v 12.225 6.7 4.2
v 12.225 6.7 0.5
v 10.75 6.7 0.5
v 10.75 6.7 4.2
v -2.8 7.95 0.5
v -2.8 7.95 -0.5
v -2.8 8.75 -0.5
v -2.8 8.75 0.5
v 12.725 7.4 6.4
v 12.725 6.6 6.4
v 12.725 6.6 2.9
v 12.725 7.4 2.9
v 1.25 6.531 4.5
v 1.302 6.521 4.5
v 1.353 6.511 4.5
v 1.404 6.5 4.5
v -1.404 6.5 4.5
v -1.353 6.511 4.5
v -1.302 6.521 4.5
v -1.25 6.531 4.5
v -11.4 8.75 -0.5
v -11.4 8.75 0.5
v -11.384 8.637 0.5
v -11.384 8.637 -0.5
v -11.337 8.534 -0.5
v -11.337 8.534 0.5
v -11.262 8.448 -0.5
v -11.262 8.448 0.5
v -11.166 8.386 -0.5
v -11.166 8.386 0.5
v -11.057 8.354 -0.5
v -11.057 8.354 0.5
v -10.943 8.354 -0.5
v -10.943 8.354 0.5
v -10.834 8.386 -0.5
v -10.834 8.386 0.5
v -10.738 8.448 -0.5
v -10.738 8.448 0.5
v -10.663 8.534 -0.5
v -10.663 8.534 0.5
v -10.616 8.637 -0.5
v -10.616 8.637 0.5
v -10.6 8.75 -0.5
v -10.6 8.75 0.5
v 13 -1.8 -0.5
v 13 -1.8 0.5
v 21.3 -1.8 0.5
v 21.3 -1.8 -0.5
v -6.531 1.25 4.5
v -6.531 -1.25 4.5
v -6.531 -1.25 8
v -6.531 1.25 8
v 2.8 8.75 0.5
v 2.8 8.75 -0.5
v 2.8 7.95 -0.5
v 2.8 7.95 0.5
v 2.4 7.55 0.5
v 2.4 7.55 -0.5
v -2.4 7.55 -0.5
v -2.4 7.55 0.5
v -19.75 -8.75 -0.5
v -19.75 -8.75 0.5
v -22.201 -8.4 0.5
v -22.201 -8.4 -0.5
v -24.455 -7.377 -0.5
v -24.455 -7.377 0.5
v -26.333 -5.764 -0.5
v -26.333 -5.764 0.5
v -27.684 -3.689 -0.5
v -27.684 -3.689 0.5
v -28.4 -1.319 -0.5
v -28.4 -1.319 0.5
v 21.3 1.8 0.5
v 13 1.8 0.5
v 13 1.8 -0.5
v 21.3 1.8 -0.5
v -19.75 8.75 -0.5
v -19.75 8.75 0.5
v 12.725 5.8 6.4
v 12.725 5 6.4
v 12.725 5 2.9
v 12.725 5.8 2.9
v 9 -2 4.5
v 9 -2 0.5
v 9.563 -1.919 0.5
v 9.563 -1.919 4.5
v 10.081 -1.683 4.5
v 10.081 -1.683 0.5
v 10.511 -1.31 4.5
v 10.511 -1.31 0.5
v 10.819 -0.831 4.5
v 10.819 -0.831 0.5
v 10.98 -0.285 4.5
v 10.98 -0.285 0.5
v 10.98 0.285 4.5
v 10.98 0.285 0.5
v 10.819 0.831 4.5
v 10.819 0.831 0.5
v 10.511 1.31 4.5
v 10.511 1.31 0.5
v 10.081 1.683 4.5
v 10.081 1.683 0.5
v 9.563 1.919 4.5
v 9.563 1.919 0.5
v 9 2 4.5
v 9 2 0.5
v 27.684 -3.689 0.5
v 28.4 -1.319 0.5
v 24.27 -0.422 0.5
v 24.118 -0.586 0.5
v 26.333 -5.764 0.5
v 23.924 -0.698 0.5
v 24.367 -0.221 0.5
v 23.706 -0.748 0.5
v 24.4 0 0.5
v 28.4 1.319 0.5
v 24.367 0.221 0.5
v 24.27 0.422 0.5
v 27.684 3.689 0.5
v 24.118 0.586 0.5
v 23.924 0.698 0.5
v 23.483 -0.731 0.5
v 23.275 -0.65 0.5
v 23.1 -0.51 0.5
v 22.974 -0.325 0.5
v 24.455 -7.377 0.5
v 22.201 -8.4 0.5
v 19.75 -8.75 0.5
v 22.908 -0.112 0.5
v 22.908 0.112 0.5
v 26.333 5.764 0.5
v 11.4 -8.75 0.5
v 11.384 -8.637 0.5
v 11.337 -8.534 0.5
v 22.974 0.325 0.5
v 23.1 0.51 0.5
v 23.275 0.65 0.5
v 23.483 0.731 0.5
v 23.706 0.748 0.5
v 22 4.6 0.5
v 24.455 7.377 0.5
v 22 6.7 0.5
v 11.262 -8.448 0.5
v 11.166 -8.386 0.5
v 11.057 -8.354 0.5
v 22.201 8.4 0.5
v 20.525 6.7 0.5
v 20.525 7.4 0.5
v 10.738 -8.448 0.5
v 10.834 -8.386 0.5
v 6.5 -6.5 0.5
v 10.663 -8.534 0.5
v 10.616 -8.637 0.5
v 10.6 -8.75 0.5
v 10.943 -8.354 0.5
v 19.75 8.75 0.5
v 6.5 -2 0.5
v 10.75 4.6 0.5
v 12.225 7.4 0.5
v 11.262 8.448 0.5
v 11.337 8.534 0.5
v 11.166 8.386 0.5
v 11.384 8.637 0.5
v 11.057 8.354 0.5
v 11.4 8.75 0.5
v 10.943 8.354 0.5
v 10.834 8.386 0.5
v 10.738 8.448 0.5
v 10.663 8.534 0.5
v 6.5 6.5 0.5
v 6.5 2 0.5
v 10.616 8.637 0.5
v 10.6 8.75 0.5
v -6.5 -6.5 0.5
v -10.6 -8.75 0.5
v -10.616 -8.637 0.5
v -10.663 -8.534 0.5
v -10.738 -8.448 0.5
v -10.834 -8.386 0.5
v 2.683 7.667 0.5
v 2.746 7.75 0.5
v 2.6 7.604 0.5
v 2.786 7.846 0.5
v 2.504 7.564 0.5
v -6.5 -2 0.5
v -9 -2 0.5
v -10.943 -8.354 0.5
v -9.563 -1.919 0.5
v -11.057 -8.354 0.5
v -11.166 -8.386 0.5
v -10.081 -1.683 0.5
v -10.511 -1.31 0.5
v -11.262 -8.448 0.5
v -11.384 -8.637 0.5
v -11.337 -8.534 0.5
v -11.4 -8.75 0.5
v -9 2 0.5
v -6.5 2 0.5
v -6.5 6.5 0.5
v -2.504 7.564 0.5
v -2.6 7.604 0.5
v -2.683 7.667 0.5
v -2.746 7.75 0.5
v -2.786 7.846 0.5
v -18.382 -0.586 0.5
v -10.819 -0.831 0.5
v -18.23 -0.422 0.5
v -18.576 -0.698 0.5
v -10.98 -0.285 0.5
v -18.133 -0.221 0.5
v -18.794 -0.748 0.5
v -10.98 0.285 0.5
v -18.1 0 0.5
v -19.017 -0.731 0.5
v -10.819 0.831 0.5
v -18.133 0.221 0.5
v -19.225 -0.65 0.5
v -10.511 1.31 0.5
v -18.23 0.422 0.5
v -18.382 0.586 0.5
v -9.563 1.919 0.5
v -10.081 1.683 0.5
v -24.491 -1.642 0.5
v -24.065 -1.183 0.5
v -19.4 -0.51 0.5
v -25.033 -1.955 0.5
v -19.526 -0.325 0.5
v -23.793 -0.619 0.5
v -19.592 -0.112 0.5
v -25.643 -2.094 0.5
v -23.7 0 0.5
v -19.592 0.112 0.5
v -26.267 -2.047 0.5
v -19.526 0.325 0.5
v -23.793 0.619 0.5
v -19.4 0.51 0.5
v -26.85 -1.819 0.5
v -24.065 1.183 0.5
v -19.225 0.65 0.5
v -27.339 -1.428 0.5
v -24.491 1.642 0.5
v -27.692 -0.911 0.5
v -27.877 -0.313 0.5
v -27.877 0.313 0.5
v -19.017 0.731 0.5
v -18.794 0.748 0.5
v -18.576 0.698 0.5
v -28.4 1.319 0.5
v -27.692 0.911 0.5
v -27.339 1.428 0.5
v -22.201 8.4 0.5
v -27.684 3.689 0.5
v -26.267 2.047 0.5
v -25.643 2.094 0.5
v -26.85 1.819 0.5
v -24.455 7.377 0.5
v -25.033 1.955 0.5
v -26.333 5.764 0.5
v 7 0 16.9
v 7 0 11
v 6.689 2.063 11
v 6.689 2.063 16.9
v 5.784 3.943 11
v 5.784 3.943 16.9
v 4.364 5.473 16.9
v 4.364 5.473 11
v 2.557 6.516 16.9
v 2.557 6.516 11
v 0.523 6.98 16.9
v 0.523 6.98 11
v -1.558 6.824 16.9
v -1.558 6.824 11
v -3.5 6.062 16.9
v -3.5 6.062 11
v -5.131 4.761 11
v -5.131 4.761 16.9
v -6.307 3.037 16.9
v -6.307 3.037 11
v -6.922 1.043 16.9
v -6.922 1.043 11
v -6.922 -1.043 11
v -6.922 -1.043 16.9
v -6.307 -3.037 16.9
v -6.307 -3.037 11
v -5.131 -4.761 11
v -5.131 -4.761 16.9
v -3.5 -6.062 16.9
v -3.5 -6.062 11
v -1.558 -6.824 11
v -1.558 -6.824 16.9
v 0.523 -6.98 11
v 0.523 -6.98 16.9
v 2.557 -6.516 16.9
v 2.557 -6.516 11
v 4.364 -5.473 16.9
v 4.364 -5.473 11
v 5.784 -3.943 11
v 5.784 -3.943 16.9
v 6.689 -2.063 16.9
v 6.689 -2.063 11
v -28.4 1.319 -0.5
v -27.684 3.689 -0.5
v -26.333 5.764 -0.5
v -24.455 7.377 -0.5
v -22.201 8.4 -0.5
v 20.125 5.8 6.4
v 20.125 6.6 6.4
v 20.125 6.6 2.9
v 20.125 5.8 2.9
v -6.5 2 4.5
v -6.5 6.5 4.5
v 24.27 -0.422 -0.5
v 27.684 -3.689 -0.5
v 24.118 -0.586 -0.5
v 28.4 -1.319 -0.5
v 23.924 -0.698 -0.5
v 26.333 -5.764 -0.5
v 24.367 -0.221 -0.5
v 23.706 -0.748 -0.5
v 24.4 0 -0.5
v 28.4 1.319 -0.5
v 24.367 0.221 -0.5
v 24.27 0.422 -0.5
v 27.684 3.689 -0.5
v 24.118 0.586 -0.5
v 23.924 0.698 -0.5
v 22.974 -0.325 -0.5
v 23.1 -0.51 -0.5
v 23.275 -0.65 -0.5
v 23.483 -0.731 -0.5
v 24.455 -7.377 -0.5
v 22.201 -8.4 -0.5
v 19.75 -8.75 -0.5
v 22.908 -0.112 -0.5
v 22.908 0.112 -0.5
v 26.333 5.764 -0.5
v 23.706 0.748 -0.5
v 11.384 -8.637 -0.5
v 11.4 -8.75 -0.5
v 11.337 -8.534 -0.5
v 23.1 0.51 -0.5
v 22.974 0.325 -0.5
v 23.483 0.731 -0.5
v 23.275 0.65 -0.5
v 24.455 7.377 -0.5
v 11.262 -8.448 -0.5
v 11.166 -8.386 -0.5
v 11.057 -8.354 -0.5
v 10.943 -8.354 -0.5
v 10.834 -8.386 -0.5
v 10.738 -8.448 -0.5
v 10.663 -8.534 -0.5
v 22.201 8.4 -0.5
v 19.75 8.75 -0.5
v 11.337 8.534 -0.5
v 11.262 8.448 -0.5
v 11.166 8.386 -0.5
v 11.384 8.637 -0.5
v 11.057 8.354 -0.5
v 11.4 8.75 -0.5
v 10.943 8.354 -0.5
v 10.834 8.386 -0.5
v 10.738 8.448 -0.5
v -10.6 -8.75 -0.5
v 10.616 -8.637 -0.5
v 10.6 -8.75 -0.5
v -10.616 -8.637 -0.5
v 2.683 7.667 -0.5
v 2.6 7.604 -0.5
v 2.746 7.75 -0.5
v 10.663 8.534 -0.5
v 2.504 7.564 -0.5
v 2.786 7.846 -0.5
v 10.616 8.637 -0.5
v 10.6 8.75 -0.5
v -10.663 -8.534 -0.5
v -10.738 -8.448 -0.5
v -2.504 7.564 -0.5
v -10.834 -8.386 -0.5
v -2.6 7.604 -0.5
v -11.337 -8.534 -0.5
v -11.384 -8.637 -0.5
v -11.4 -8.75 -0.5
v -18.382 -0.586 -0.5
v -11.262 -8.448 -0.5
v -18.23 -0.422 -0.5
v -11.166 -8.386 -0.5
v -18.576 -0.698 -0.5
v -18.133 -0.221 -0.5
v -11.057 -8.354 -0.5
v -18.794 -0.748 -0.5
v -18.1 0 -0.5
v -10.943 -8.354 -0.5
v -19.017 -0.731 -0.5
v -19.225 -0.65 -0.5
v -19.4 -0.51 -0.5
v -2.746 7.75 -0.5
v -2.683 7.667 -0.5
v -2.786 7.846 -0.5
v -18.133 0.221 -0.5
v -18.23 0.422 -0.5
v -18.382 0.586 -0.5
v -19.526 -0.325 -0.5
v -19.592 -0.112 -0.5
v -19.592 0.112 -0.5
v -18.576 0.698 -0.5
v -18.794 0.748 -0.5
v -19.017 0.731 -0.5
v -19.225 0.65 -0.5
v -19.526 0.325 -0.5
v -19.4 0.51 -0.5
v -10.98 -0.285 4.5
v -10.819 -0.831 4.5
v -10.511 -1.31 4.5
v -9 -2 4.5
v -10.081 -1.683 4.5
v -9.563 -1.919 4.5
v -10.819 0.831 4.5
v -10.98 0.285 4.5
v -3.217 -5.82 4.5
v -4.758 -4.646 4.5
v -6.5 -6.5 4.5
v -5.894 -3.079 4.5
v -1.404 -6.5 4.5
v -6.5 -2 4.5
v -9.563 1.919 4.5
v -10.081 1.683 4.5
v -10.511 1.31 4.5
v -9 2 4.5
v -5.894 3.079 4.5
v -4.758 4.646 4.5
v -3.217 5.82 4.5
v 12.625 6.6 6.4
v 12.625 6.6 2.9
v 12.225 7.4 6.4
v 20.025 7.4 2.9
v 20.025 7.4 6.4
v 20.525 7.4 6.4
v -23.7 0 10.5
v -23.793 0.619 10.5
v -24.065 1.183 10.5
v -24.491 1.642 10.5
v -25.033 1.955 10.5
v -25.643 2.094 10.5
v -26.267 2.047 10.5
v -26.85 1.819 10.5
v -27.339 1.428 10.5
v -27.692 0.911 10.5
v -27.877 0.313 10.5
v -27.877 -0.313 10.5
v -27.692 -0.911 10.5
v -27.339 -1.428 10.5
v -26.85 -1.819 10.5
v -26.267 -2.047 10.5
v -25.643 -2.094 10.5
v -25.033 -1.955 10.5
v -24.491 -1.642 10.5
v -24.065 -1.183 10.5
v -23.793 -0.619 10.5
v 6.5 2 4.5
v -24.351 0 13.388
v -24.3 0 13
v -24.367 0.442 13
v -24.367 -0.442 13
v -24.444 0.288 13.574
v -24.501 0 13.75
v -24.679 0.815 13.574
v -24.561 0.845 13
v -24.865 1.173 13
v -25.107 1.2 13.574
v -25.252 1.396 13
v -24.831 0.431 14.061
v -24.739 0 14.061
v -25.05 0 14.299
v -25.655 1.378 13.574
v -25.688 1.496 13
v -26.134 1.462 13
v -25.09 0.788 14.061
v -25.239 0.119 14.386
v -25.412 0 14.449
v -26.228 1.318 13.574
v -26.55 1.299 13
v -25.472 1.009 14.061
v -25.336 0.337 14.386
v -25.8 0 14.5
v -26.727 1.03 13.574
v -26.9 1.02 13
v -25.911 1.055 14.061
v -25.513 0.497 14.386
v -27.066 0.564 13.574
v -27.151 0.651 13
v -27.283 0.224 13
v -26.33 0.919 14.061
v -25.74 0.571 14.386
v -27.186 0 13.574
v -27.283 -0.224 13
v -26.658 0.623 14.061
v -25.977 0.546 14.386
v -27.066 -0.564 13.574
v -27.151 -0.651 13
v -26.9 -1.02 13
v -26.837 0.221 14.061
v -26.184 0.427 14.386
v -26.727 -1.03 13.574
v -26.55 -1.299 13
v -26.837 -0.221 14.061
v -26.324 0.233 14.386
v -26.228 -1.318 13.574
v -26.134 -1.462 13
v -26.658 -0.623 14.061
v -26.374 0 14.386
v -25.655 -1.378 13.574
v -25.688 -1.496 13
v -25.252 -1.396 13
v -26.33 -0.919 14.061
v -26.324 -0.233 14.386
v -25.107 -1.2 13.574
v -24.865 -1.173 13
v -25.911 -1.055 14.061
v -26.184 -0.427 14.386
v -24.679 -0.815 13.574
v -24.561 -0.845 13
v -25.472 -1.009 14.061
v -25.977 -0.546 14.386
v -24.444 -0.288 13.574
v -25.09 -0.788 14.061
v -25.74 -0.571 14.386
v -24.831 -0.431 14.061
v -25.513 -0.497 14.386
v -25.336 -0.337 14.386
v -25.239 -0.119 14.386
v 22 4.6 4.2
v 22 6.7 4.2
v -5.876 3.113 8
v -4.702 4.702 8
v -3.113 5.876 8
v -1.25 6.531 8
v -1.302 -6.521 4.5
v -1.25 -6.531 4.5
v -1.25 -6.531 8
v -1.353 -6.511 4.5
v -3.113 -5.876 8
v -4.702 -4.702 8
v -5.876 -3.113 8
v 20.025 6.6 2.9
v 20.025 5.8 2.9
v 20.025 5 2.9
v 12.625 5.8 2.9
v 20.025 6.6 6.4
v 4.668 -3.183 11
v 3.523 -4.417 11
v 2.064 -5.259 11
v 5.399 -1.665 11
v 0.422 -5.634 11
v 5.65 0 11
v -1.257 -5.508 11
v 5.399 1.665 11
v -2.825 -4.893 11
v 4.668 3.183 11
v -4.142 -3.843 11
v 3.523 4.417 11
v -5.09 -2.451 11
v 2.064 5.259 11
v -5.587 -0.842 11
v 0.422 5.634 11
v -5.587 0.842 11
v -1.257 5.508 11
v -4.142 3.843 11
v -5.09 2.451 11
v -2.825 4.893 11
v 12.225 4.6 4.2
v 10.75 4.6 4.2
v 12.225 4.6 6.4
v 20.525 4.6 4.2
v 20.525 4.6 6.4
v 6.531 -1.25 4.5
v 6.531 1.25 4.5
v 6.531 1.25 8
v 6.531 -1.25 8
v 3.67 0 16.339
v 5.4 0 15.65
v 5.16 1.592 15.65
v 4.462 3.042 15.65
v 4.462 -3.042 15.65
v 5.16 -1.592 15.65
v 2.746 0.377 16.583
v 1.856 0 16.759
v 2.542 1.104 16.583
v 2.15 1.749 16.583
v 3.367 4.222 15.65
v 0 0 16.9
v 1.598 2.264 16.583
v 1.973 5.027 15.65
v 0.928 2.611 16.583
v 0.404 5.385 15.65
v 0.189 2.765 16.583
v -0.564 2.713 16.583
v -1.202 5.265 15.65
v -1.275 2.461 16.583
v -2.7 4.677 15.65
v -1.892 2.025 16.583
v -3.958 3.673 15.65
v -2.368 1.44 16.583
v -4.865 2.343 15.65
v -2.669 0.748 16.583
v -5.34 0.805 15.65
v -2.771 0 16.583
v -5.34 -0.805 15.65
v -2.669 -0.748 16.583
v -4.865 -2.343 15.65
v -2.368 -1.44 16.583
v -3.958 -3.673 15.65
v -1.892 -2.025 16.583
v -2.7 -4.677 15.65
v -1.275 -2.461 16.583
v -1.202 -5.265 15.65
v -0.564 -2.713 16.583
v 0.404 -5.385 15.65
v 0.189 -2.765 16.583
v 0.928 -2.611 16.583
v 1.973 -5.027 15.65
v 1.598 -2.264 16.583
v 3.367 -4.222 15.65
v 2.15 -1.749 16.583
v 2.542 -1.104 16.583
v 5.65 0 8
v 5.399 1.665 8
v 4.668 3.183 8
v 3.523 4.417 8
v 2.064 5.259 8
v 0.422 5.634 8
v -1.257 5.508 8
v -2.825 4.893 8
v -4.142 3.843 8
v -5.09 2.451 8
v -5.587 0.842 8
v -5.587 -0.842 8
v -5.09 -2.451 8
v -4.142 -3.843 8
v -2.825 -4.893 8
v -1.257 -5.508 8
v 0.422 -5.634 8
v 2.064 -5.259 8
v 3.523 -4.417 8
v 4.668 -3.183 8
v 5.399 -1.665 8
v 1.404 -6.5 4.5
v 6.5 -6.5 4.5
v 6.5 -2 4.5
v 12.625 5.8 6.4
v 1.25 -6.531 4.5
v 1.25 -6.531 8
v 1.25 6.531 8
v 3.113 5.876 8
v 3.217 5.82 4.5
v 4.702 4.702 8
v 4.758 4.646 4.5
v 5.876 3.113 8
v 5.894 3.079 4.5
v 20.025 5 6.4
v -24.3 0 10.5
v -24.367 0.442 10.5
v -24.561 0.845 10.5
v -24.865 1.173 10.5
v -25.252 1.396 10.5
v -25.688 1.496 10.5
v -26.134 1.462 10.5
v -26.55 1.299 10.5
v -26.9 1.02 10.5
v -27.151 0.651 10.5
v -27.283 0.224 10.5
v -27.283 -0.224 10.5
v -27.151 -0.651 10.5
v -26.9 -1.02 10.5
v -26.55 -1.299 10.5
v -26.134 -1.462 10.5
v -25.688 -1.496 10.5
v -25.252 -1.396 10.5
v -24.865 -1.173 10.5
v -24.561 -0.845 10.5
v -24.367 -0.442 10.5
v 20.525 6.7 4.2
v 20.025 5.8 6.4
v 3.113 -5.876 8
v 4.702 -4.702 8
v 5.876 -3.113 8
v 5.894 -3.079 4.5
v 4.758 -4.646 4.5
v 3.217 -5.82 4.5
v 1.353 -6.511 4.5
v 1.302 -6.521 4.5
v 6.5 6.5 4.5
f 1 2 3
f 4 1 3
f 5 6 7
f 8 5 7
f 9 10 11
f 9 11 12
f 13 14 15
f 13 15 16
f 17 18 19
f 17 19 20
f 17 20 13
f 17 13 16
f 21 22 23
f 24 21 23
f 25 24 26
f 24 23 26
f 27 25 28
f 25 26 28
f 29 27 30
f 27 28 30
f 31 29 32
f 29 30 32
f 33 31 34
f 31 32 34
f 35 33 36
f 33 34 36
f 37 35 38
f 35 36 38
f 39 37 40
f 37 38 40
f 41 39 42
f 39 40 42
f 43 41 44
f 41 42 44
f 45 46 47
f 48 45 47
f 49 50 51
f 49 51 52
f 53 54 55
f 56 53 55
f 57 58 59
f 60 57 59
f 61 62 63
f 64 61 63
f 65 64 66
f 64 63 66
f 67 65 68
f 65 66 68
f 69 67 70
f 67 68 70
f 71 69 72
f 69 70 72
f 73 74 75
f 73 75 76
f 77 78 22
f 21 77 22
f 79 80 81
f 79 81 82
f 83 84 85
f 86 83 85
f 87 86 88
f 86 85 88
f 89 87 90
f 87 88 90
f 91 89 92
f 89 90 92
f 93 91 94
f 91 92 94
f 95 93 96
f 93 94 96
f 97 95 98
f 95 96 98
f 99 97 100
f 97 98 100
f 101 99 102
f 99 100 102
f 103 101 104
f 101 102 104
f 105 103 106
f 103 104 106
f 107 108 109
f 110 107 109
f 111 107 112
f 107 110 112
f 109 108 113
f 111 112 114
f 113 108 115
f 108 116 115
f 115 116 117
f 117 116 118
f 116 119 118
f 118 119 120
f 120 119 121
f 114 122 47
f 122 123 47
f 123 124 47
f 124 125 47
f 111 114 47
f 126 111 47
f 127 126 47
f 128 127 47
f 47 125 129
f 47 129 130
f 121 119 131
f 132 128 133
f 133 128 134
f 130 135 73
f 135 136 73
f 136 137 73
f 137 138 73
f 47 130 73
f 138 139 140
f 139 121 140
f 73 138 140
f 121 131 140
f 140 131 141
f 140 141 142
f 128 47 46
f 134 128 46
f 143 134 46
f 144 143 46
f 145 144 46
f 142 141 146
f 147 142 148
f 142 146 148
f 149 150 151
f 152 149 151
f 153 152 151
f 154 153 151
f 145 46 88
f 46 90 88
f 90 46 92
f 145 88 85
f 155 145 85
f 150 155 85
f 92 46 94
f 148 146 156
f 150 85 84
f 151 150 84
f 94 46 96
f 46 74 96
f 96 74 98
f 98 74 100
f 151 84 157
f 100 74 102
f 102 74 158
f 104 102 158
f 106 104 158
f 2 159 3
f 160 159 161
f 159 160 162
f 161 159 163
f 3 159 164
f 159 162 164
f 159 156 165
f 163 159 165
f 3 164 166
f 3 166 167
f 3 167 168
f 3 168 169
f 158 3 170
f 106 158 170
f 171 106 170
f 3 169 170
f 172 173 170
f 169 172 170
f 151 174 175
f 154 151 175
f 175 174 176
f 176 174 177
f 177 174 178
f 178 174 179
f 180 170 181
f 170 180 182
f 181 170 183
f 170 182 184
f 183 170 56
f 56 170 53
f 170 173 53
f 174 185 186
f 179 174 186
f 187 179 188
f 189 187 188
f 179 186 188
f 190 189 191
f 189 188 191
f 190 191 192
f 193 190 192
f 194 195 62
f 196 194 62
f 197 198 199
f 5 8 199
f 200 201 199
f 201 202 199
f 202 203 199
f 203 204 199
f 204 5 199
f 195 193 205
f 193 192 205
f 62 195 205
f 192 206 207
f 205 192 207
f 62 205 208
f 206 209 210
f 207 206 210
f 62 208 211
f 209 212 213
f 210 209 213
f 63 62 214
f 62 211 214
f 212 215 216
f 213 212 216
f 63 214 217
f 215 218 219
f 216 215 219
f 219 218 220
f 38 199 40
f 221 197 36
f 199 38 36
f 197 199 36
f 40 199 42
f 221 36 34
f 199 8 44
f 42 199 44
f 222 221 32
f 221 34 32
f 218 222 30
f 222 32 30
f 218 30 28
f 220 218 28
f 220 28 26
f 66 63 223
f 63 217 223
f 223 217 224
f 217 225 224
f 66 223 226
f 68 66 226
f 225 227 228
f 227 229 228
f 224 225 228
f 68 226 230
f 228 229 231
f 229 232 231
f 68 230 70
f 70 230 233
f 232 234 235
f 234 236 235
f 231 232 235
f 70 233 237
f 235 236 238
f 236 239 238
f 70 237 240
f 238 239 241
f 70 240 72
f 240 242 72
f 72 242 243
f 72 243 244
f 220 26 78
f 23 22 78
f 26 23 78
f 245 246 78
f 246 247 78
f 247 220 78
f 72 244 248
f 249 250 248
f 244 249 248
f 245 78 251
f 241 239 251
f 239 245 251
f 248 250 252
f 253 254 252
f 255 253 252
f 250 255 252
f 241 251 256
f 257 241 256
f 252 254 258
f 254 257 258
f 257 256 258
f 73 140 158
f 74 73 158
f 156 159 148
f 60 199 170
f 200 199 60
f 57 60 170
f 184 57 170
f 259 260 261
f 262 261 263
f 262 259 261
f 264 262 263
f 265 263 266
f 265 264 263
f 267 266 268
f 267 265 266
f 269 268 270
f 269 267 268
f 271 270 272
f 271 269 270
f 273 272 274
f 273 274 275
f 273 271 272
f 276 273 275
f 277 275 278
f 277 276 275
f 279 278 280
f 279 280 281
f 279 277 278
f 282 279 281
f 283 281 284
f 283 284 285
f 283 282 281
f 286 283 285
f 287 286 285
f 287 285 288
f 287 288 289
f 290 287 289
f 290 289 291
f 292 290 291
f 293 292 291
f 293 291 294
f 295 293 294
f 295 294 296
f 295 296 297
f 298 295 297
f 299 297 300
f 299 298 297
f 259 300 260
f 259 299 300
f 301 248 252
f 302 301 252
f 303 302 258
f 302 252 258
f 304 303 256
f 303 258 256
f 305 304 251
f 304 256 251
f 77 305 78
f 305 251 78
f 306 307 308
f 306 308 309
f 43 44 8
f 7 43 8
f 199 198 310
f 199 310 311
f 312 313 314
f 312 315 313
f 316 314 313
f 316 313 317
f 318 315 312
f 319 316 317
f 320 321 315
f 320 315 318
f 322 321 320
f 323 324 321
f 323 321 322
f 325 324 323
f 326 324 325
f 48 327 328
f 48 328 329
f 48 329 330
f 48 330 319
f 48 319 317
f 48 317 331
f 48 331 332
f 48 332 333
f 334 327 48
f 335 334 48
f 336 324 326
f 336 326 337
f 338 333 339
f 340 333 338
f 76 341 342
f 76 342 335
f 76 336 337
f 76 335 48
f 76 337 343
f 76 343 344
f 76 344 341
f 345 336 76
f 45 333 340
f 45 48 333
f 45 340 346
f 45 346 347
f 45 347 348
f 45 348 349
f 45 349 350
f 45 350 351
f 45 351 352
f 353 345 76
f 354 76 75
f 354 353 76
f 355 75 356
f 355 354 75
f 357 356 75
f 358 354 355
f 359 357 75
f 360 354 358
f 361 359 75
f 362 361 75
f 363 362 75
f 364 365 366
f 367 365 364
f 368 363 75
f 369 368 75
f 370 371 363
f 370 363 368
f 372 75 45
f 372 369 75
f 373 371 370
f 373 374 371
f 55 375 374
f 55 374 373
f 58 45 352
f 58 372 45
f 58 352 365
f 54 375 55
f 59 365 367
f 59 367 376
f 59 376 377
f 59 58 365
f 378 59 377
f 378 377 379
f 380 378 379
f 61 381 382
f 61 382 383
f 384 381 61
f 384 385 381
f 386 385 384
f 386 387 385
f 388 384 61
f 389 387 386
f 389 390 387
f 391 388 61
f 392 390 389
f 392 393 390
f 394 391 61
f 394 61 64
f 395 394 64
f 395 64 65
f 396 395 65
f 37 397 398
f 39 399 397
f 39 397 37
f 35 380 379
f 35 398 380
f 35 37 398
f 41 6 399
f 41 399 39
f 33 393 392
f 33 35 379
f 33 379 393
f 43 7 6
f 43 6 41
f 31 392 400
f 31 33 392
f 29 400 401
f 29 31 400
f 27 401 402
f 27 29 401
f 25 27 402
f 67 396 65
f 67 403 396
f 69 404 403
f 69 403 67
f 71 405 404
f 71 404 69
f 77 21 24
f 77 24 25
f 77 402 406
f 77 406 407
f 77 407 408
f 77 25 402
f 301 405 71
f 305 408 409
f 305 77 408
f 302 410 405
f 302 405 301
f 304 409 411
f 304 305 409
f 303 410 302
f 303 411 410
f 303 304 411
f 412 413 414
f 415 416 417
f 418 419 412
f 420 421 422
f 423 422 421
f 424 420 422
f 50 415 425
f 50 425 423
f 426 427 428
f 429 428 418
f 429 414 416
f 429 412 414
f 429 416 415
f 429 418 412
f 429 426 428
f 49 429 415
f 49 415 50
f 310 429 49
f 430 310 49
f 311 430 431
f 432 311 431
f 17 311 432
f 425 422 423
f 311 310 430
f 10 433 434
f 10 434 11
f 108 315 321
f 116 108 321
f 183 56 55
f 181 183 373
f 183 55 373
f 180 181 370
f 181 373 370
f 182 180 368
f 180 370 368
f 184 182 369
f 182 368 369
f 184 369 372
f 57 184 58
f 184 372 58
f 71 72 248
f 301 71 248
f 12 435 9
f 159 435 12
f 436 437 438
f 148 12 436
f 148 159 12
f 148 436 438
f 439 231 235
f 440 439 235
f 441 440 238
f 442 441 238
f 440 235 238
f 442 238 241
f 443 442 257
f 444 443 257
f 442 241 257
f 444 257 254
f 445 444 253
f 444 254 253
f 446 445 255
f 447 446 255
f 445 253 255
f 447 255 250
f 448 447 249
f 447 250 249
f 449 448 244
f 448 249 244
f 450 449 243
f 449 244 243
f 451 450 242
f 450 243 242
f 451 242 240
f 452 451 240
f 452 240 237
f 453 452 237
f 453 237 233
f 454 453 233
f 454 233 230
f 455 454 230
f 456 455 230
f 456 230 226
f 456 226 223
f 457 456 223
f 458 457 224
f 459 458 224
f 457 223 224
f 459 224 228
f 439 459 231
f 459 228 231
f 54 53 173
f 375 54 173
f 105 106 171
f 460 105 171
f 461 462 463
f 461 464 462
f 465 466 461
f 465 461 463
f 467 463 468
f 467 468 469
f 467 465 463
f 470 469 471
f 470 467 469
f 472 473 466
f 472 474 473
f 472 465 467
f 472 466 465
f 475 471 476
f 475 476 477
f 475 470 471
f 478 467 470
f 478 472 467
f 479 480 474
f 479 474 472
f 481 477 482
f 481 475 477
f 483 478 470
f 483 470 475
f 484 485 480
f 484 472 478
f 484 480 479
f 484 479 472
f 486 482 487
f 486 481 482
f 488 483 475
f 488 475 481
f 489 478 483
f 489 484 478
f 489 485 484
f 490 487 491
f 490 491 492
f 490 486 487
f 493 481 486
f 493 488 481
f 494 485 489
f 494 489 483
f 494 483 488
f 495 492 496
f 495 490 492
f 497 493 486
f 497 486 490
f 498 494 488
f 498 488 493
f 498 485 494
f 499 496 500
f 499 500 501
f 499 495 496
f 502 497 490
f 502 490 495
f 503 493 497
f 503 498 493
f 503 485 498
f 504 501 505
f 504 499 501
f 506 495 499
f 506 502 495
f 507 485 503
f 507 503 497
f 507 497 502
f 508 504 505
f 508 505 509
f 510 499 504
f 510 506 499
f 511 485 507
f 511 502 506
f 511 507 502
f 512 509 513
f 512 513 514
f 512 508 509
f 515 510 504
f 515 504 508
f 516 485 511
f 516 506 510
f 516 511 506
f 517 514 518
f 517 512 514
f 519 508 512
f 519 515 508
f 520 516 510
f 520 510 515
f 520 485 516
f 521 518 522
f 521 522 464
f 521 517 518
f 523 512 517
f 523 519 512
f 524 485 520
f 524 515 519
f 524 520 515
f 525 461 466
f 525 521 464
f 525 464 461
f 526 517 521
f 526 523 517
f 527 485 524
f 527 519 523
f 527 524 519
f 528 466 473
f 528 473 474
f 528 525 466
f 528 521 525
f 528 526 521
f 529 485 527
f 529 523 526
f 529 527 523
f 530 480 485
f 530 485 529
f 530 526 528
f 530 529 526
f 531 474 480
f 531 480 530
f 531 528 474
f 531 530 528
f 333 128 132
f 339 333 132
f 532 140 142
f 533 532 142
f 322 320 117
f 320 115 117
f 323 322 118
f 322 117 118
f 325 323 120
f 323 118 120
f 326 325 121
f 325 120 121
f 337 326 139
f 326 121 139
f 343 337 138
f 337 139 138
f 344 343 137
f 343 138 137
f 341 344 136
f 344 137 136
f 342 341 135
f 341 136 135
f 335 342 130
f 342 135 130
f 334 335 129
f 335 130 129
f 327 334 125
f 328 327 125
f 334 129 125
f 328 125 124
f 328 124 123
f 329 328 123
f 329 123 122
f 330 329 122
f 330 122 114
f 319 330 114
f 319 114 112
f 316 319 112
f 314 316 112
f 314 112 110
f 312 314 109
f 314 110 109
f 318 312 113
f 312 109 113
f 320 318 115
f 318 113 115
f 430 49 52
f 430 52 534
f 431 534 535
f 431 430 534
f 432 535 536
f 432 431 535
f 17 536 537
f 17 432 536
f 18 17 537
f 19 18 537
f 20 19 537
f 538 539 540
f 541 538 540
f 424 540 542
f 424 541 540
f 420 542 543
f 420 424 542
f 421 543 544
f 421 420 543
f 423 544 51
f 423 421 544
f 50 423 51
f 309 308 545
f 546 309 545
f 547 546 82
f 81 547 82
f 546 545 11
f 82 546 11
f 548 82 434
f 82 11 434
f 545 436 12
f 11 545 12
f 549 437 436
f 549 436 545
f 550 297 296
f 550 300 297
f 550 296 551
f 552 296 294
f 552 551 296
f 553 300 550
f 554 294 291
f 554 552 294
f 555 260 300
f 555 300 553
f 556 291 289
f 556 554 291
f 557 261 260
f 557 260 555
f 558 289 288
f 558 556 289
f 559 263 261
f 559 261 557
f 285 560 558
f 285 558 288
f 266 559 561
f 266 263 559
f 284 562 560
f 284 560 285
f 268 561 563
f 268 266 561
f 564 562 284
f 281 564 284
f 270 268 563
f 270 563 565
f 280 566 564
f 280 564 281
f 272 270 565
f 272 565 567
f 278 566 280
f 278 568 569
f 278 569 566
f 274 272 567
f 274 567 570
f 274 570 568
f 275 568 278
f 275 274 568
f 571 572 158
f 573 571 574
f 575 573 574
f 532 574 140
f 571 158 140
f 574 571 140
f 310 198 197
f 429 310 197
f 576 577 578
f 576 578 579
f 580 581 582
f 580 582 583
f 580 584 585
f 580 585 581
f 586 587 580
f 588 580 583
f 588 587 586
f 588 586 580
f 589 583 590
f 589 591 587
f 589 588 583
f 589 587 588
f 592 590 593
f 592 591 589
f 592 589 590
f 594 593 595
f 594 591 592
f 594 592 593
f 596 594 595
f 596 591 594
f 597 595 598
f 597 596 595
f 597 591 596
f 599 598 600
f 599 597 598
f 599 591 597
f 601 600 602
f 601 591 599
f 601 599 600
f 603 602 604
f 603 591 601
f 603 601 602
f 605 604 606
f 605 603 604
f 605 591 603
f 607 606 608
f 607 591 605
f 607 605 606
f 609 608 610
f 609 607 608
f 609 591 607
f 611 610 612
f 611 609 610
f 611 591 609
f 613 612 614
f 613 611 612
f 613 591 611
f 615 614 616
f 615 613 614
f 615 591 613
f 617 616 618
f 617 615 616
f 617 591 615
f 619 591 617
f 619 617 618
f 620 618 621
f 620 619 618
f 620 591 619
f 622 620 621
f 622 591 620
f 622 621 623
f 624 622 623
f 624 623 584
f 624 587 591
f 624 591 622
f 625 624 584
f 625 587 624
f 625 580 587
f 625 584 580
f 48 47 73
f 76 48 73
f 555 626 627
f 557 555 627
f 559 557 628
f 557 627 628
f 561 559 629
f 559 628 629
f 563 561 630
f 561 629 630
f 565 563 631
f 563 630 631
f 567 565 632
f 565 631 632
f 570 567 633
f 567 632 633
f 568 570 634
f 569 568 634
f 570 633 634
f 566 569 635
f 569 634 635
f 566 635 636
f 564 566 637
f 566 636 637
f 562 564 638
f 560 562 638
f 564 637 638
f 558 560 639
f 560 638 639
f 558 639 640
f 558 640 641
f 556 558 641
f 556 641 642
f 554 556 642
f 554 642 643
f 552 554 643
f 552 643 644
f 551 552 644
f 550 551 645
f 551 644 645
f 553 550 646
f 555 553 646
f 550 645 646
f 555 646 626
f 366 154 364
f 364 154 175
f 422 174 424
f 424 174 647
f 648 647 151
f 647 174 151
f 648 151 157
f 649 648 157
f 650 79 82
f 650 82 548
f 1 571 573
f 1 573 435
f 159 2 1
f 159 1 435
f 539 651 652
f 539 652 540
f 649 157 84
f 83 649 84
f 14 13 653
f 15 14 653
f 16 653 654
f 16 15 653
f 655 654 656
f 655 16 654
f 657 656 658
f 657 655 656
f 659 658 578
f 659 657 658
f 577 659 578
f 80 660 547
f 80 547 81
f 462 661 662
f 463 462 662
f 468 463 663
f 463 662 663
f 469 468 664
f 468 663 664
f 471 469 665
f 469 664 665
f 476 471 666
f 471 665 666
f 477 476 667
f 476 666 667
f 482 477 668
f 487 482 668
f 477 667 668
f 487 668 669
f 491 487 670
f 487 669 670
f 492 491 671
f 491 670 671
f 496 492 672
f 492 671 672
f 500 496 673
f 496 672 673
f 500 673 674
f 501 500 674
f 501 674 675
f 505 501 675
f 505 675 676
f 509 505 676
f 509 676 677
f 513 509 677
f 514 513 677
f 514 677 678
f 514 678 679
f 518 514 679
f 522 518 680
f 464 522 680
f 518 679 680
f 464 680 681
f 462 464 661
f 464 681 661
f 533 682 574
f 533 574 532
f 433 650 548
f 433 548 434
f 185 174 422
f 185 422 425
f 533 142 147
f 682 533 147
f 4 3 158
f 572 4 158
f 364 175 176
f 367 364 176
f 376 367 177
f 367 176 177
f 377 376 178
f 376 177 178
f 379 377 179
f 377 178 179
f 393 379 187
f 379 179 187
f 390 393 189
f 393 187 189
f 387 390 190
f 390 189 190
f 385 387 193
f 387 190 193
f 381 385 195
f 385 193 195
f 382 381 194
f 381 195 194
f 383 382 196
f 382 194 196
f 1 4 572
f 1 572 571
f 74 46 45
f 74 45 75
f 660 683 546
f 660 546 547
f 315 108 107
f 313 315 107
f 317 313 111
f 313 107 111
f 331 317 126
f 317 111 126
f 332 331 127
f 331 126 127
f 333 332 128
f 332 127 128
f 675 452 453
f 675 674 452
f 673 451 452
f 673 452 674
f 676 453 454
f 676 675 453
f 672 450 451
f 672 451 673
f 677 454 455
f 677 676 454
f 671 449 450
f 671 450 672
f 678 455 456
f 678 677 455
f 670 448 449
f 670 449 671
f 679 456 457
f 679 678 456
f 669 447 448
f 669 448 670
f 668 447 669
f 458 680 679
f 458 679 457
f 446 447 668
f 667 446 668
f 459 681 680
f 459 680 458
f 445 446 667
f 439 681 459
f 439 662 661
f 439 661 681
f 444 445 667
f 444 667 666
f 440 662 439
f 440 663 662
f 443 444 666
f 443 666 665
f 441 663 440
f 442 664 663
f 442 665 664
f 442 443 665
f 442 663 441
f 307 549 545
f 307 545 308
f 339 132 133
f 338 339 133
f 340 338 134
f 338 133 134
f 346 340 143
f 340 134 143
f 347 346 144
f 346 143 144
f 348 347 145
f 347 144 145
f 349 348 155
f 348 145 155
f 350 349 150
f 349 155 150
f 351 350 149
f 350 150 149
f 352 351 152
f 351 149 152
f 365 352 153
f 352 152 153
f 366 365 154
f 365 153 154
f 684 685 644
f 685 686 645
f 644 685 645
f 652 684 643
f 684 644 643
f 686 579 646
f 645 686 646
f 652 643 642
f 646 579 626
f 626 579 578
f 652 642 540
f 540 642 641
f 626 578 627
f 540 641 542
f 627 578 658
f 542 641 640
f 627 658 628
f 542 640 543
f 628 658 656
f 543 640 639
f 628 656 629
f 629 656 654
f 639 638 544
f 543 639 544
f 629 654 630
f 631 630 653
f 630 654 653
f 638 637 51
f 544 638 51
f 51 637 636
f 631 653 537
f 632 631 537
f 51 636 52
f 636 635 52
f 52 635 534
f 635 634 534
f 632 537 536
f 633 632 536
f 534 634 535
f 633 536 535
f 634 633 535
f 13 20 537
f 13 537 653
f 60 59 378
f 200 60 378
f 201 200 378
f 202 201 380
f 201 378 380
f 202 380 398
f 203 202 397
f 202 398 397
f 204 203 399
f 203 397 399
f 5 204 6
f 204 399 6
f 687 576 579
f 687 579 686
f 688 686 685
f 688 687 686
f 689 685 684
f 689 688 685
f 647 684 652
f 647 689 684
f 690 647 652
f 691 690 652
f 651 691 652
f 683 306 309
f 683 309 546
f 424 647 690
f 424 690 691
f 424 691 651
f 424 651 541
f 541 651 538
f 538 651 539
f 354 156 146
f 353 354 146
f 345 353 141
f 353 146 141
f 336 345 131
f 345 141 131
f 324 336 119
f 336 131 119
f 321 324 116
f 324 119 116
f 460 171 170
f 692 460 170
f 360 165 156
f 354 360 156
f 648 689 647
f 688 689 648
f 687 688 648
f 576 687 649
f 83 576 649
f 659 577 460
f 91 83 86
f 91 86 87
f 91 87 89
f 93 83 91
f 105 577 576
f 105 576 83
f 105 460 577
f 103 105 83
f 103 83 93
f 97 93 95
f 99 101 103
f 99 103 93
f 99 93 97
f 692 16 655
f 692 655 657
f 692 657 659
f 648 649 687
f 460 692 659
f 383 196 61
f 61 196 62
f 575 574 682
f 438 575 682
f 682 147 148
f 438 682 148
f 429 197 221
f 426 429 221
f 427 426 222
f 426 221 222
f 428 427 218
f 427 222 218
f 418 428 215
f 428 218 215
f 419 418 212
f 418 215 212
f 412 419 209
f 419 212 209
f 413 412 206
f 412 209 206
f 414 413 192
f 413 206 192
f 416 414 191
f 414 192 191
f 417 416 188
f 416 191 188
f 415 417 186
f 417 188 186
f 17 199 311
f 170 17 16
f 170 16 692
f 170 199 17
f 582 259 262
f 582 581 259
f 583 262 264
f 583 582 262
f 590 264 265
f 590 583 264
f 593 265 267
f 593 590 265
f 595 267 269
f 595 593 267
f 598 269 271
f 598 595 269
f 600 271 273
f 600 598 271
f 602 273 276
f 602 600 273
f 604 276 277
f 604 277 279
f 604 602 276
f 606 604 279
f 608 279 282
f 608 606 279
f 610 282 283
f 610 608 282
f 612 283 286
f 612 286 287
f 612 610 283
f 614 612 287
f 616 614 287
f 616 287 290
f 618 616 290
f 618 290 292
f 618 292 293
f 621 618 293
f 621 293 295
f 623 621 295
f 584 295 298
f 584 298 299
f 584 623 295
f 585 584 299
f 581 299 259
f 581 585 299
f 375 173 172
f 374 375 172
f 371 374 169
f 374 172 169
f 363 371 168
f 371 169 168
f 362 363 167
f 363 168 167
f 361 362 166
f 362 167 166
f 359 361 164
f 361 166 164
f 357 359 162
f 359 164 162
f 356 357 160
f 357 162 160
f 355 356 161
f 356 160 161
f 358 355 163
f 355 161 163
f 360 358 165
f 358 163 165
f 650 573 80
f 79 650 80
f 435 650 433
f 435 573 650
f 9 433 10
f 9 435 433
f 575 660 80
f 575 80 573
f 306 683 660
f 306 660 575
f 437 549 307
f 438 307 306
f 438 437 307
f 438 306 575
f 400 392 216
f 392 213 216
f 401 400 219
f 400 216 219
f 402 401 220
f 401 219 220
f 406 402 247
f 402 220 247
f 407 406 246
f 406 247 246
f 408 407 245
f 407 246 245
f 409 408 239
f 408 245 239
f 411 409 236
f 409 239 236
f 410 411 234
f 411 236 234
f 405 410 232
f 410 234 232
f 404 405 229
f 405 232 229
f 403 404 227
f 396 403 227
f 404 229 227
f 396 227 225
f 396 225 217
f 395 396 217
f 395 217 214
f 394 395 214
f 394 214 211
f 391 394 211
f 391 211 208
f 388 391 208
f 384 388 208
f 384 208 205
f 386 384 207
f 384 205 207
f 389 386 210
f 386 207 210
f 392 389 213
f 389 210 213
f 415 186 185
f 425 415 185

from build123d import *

# Parameters (mm, degrees)
BOSS_EXTRUDE1_DEPTH     = 0.5
SKETCH2_W               = 2
SKETCH2_H               = 10
CUT_EXTRUDE1_DEPTH      = 1.5
CUT_EXTRUDE1_DEPTH_BACK = 1.5
SKETCH3_R               = 0.75
SKETCH3_W               = 8.3
SKETCH3_H               = 3.6
CUT_EXTRUDE2_DEPTH      = 1.5
CUT_EXTRUDE2_DEPTH_BACK = 1.5
SKETCH4_R               = 2.1
BOSS_EXTRUDE2_DEPTH     = 10
SKETCH5_R               = 1.5
BOSS_EXTRUDE3_DEPTH     = 2.5
DOME1_FACE_RADIUS       = 1.5
DOME1_HEIGHT            = 1.5
SKETCH6_W               = 13
SKETCH6_H               = 4
SKETCH6_H_2             = 4.5
BOSS_EXTRUDE4_DEPTH     = 4
BOSS_EXTRUDE5_DEPTH     = 3.5
SKETCH8_R               = 5.65
BOSS_EXTRUDE6_DEPTH     = 3
BOSS_EXTRUDE7_DEPTH     = 3.7
SKETCH11_W              = 8.3
SKETCH11_H              = 2.8
BOSS_EXTRUDE8_DEPTH     = 2.2
CUT_EXTRUDE3_DEPTH      = 3.5
CUT_EXTRUDE4_REACH      = 3
SKETCH15_R              = 0.4


with BuildPart() as part:
    # Sketch1 → Boss-Extrude1 (new body, symmetric)
    with BuildSketch(Plane.XY):
        with BuildLine():
            Line((-19.75, 8.75), (19.75, 8.75))
            ThreePointArc((19.75, 8.75), (28.5, 0), (19.75, -8.75))
            Line((19.75, -8.75), (-19.75, -8.75))
            ThreePointArc((-19.75, -8.75), (-28.5, 0), (-19.75, 8.75))
        make_face()
    extrude(amount=BOSS_EXTRUDE1_DEPTH, both=True)

    # Sketch2 → Cut-Extrude1 (cut, two sides)
    with BuildSketch(Plane.XY) as cut_extrude1_sk:
        with Locations((29.4, 0)):
            Rectangle(SKETCH2_W, SKETCH2_H)
        with Locations((-29.4, 0)):
            Rectangle(SKETCH2_W, SKETCH2_H)
        with BuildLine():
            Line((2.4, 7.55), (-2.4, 7.55))
            ThreePointArc((-2.4, 7.55), (-2.682842712, 7.667157288), (-2.8, 7.95))
            Line((-2.8, 7.95), (-2.8, 9.95))
            Line((-2.8, 9.95), (2.8, 9.95))
            Line((2.8, 9.95), (2.8, 7.95))
            ThreePointArc((2.8, 7.95), (2.682842712, 7.667157288), (2.4, 7.55))
        make_face()
    extrude(amount=CUT_EXTRUDE1_DEPTH, mode=Mode.SUBTRACT)
    extrude(cut_extrude1_sk.sketch, amount=-CUT_EXTRUDE1_DEPTH_BACK, mode=Mode.SUBTRACT)

    # Sketch3 → Cut-Extrude2 (cut, two sides)
    with BuildSketch(Plane.XY) as cut_extrude2_sk:
        with Locations((23.65, 0)):
            Circle(SKETCH3_R)
        with Locations((-18.85, 0)):
            Circle(SKETCH3_R)
        with Locations((17.15, 0)):
            Rectangle(SKETCH3_W, SKETCH3_H)
    extrude(amount=CUT_EXTRUDE2_DEPTH, mode=Mode.SUBTRACT)
    extrude(cut_extrude2_sk.sketch, amount=-CUT_EXTRUDE2_DEPTH_BACK, mode=Mode.SUBTRACT)

    # Sketch4 → Boss-Extrude2 (add)
    with BuildSketch(Plane.XY.offset(0.5)):
        with Locations((-25.8, 0)):
            Circle(SKETCH4_R)
    extrude(amount=BOSS_EXTRUDE2_DEPTH)

    # Sketch5 → Boss-Extrude3 (add)
    with BuildSketch(Plane.XY.offset(10.5)):
        with Locations((-25.8, 0)):
            Circle(SKETCH5_R)
    extrude(amount=BOSS_EXTRUDE3_DEPTH)

    # Dome1: a dome of height H over a round flat face of radius A is a cap of a sphere of radius (A * A + H * H) / (2 * H)
    dome1_r = (DOME1_FACE_RADIUS * DOME1_FACE_RADIUS + DOME1_HEIGHT * DOME1_HEIGHT) / (2 * DOME1_HEIGHT)
    dome1_base = Plane((-25.8, 0, 13), z_dir=(0, 0, 1))
    with Locations(dome1_base.offset(DOME1_HEIGHT - dome1_r)):
        dome1_ball = Sphere(dome1_r, mode=Mode.PRIVATE)
    add(split(dome1_ball, bisect_by=dome1_base, keep=Keep.TOP, mode=Mode.PRIVATE))

    # Sketch6 → Boss-Extrude4 (add)
    with BuildSketch(Plane.XY.offset(0.5)):
        with BuildLine():
            Line((-6.5, -2), (-6.5, 2))
            Line((-6.5, 2), (-9, 2))
            ThreePointArc((-9, 2), (-11, 0), (-9, -2))
            Line((-9, -2), (-6.5, -2))
        make_face()
        Rectangle(SKETCH6_W, SKETCH6_H)
        with BuildLine():
            Line((9, 2), (6.5, 2))
            Line((6.5, 2), (6.5, -2))
            Line((6.5, -2), (9, -2))
            ThreePointArc((9, -2), (11, 0), (9, 2))
        make_face()
        with Locations((0, -4.25)):
            Rectangle(SKETCH6_W, SKETCH6_H_2)
        with Locations((0, 4.25)):
            Rectangle(SKETCH6_W, SKETCH6_H_2)
    extrude(amount=BOSS_EXTRUDE4_DEPTH)

    # Sketch7 → Boss-Extrude5 (add)
    with BuildSketch(Plane.XY.offset(4.5)):
        with BuildLine():
            Line((6.531462317, 1.25), (6.531462317, -1.25))
            ThreePointArc((6.531462317, -1.25), (4.702260095, -4.702260095), (1.25, -6.531462317))
            Line((1.25, -6.531462317), (-1.25, -6.531462317))
            ThreePointArc((-1.25, -6.531462317), (-4.702260095, -4.702260095), (-6.531462317, -1.25))
            Line((-6.531462317, -1.25), (-6.531462317, 1.25))
            ThreePointArc((-6.531462317, 1.25), (-4.702260095, 4.702260095), (-1.25, 6.531462317))
            Line((-1.25, 6.531462317), (1.25, 6.531462317))
            ThreePointArc((1.25, 6.531462317), (4.702260095, 4.702260095), (6.531462317, 1.25))
        make_face()
    extrude(amount=BOSS_EXTRUDE5_DEPTH)

    # Sketch8 → Boss-Extrude6 (add)
    with BuildSketch(Plane.XY.offset(8)):
        Circle(SKETCH8_R)
    extrude(amount=BOSS_EXTRUDE6_DEPTH)

    # Sketch9 → Revolve1 (revolve)
    with BuildSketch(Plane(origin=(0, 0, 0), x_dir=(1, 0, 0), z_dir=(0, 1, 0))):
        with BuildLine():
            Line((0, -11), (7, -11))
            Line((7, -11), (7, -16.9))
            Line((7, -16.9), (5.4, -15.65))
            ThreePointArc((5.4, -15.65), (2.771394054, -16.583422311), (0, -16.9))
            Line((0, -16.9), (0, -11))
        make_face()
    revolve(axis=Axis((0, 0, 0.5), (0, 0, 1)))

    # Sketch10 → Boss-Extrude7 (add)
    with BuildSketch(Plane.XY.offset(0.5)):
        Polygon((10.75, 4.6), (22, 4.6), (22, 6.7), (20.525, 6.7), (20.525, 7.4), (12.225, 7.4), (12.225, 6.7), (10.75, 6.7), align=None)
    extrude(amount=BOSS_EXTRUDE7_DEPTH)

    # Sketch11 → Boss-Extrude8 (add)
    with BuildSketch(Plane.XY.offset(4.2)):
        with Locations((16.375, 6)):
            Rectangle(SKETCH11_W, SKETCH11_H)
    extrude(amount=BOSS_EXTRUDE8_DEPTH)

    # Sketch12 → Cut-Extrude3 (cut)
    with BuildSketch(Plane.XY.offset(6.4)):
        Polygon((20.025, 7.4), (20.025, 6.6), (20.125, 6.6), (20.125, 5.8), (20.025, 5.8), (20.025, 5), (12.725, 5), (12.725, 5.8), (12.625, 5.8), (12.625, 6.6), (12.725, 6.6), (12.725, 7.4), align=None)
    extrude(amount=-CUT_EXTRUDE3_DEPTH, mode=Mode.SUBTRACT)

    # Sketch15 → Cut-Extrude4 (cut, up to next)
    with BuildSketch(Plane.XY.offset(0.5), mode=Mode.PRIVATE) as cut_extrude4_sk1:
        with Locations((11, 8.75)):
            Circle(SKETCH15_R)
    cut_extrude4_tool1 = extrude(cut_extrude4_sk1.sketch, amount=-CUT_EXTRUDE4_REACH, mode=Mode.PRIVATE) & part.part
    add(cut_extrude4_tool1.solids().sort_by_distance((11, 8.75, 0.5))[0], mode=Mode.SUBTRACT)
    # Sketch15 → Cut-Extrude4 (cut, up to next)
    with BuildSketch(Plane.XY.offset(0.5), mode=Mode.PRIVATE) as cut_extrude4_sk2:
        with Locations((-11, 8.75)):
            Circle(SKETCH15_R)
    cut_extrude4_tool2 = extrude(cut_extrude4_sk2.sketch, amount=-CUT_EXTRUDE4_REACH, mode=Mode.PRIVATE) & part.part
    add(cut_extrude4_tool2.solids().sort_by_distance((-11, 8.75, 0.5))[0], mode=Mode.SUBTRACT)
    # Sketch15 → Cut-Extrude4 (cut, up to next)
    with BuildSketch(Plane.XY.offset(0.5), mode=Mode.PRIVATE) as cut_extrude4_sk3:
        with Locations((-11, -8.75)):
            Circle(SKETCH15_R)
    cut_extrude4_tool3 = extrude(cut_extrude4_sk3.sketch, amount=-CUT_EXTRUDE4_REACH, mode=Mode.PRIVATE) & part.part
    add(cut_extrude4_tool3.solids().sort_by_distance((-11, -8.75, 0.5))[0], mode=Mode.SUBTRACT)
    # Sketch15 → Cut-Extrude4 (cut, up to next)
    with BuildSketch(Plane.XY.offset(0.5), mode=Mode.PRIVATE) as cut_extrude4_sk4:
        with Locations((11, -8.75)):
            Circle(SKETCH15_R)
    cut_extrude4_tool4 = extrude(cut_extrude4_sk4.sketch, amount=-CUT_EXTRUDE4_REACH, mode=Mode.PRIVATE) & part.part
    add(cut_extrude4_tool4.solids().sort_by_distance((11, -8.75, 0.5))[0], mode=Mode.SUBTRACT)


solid = part.part
